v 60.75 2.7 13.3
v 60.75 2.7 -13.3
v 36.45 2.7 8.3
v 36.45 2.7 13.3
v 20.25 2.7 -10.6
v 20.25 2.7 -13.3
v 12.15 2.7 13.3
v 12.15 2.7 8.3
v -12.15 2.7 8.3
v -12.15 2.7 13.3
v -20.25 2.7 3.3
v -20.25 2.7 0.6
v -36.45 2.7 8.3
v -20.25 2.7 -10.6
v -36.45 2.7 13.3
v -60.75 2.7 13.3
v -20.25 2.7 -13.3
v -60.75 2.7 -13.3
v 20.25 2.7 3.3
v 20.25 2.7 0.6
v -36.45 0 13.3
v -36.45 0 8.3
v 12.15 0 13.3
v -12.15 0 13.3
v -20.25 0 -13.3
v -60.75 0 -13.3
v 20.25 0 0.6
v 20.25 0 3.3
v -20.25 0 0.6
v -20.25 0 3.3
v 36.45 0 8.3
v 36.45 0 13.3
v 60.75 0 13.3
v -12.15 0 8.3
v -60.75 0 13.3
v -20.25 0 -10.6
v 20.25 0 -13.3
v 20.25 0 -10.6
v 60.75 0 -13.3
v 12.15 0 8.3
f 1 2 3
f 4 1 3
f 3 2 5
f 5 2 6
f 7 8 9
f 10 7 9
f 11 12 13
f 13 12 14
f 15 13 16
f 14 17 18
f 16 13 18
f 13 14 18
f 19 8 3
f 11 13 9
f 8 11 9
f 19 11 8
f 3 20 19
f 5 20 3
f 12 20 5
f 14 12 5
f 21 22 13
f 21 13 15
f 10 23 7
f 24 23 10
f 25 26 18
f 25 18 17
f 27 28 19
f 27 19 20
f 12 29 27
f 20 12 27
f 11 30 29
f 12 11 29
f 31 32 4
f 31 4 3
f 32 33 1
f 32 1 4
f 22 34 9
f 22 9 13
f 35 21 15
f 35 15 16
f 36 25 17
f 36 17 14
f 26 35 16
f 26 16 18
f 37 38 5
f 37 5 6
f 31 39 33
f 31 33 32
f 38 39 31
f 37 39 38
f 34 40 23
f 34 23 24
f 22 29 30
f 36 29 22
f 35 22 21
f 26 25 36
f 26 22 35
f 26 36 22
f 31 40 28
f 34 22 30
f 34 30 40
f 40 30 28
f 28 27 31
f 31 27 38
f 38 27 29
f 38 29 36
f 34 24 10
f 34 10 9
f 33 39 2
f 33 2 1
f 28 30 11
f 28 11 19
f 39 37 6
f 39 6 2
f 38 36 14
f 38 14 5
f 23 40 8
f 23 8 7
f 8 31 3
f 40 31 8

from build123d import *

# Parameters (mm, degrees)
SKETCH1_W           = 40.5
SKETCH1_H           = 2.7
BOSS_EXTRUDE1_DEPTH = 2.7


with BuildPart() as part:
    # Sketch1 → Boss-Extrude1 (new body)
    with BuildSketch(Plane(origin=(0, 0, 0), x_dir=(1, 0, 0), z_dir=(0, 1, 0))):
        Polygon((-60.75, 13.3), (-20.25, 13.3), (-20.25, 10.6), (20.25, 10.6), (20.25, 13.3), (60.75, 13.3), (60.75, -13.3), (36.45, -13.3), (36.45, -8.3), (12.15, -8.3), (12.15, -13.3), (-12.15, -13.3), (-12.15, -8.3), (-36.45, -8.3), (-36.45, -13.3), (-60.75, -13.3), align=None)
        with Locations((0, -1.95)):
            Rectangle(SKETCH1_W, SKETCH1_H, mode=Mode.SUBTRACT)
    extrude(amount=BOSS_EXTRUDE1_DEPTH)


solid = part.part
